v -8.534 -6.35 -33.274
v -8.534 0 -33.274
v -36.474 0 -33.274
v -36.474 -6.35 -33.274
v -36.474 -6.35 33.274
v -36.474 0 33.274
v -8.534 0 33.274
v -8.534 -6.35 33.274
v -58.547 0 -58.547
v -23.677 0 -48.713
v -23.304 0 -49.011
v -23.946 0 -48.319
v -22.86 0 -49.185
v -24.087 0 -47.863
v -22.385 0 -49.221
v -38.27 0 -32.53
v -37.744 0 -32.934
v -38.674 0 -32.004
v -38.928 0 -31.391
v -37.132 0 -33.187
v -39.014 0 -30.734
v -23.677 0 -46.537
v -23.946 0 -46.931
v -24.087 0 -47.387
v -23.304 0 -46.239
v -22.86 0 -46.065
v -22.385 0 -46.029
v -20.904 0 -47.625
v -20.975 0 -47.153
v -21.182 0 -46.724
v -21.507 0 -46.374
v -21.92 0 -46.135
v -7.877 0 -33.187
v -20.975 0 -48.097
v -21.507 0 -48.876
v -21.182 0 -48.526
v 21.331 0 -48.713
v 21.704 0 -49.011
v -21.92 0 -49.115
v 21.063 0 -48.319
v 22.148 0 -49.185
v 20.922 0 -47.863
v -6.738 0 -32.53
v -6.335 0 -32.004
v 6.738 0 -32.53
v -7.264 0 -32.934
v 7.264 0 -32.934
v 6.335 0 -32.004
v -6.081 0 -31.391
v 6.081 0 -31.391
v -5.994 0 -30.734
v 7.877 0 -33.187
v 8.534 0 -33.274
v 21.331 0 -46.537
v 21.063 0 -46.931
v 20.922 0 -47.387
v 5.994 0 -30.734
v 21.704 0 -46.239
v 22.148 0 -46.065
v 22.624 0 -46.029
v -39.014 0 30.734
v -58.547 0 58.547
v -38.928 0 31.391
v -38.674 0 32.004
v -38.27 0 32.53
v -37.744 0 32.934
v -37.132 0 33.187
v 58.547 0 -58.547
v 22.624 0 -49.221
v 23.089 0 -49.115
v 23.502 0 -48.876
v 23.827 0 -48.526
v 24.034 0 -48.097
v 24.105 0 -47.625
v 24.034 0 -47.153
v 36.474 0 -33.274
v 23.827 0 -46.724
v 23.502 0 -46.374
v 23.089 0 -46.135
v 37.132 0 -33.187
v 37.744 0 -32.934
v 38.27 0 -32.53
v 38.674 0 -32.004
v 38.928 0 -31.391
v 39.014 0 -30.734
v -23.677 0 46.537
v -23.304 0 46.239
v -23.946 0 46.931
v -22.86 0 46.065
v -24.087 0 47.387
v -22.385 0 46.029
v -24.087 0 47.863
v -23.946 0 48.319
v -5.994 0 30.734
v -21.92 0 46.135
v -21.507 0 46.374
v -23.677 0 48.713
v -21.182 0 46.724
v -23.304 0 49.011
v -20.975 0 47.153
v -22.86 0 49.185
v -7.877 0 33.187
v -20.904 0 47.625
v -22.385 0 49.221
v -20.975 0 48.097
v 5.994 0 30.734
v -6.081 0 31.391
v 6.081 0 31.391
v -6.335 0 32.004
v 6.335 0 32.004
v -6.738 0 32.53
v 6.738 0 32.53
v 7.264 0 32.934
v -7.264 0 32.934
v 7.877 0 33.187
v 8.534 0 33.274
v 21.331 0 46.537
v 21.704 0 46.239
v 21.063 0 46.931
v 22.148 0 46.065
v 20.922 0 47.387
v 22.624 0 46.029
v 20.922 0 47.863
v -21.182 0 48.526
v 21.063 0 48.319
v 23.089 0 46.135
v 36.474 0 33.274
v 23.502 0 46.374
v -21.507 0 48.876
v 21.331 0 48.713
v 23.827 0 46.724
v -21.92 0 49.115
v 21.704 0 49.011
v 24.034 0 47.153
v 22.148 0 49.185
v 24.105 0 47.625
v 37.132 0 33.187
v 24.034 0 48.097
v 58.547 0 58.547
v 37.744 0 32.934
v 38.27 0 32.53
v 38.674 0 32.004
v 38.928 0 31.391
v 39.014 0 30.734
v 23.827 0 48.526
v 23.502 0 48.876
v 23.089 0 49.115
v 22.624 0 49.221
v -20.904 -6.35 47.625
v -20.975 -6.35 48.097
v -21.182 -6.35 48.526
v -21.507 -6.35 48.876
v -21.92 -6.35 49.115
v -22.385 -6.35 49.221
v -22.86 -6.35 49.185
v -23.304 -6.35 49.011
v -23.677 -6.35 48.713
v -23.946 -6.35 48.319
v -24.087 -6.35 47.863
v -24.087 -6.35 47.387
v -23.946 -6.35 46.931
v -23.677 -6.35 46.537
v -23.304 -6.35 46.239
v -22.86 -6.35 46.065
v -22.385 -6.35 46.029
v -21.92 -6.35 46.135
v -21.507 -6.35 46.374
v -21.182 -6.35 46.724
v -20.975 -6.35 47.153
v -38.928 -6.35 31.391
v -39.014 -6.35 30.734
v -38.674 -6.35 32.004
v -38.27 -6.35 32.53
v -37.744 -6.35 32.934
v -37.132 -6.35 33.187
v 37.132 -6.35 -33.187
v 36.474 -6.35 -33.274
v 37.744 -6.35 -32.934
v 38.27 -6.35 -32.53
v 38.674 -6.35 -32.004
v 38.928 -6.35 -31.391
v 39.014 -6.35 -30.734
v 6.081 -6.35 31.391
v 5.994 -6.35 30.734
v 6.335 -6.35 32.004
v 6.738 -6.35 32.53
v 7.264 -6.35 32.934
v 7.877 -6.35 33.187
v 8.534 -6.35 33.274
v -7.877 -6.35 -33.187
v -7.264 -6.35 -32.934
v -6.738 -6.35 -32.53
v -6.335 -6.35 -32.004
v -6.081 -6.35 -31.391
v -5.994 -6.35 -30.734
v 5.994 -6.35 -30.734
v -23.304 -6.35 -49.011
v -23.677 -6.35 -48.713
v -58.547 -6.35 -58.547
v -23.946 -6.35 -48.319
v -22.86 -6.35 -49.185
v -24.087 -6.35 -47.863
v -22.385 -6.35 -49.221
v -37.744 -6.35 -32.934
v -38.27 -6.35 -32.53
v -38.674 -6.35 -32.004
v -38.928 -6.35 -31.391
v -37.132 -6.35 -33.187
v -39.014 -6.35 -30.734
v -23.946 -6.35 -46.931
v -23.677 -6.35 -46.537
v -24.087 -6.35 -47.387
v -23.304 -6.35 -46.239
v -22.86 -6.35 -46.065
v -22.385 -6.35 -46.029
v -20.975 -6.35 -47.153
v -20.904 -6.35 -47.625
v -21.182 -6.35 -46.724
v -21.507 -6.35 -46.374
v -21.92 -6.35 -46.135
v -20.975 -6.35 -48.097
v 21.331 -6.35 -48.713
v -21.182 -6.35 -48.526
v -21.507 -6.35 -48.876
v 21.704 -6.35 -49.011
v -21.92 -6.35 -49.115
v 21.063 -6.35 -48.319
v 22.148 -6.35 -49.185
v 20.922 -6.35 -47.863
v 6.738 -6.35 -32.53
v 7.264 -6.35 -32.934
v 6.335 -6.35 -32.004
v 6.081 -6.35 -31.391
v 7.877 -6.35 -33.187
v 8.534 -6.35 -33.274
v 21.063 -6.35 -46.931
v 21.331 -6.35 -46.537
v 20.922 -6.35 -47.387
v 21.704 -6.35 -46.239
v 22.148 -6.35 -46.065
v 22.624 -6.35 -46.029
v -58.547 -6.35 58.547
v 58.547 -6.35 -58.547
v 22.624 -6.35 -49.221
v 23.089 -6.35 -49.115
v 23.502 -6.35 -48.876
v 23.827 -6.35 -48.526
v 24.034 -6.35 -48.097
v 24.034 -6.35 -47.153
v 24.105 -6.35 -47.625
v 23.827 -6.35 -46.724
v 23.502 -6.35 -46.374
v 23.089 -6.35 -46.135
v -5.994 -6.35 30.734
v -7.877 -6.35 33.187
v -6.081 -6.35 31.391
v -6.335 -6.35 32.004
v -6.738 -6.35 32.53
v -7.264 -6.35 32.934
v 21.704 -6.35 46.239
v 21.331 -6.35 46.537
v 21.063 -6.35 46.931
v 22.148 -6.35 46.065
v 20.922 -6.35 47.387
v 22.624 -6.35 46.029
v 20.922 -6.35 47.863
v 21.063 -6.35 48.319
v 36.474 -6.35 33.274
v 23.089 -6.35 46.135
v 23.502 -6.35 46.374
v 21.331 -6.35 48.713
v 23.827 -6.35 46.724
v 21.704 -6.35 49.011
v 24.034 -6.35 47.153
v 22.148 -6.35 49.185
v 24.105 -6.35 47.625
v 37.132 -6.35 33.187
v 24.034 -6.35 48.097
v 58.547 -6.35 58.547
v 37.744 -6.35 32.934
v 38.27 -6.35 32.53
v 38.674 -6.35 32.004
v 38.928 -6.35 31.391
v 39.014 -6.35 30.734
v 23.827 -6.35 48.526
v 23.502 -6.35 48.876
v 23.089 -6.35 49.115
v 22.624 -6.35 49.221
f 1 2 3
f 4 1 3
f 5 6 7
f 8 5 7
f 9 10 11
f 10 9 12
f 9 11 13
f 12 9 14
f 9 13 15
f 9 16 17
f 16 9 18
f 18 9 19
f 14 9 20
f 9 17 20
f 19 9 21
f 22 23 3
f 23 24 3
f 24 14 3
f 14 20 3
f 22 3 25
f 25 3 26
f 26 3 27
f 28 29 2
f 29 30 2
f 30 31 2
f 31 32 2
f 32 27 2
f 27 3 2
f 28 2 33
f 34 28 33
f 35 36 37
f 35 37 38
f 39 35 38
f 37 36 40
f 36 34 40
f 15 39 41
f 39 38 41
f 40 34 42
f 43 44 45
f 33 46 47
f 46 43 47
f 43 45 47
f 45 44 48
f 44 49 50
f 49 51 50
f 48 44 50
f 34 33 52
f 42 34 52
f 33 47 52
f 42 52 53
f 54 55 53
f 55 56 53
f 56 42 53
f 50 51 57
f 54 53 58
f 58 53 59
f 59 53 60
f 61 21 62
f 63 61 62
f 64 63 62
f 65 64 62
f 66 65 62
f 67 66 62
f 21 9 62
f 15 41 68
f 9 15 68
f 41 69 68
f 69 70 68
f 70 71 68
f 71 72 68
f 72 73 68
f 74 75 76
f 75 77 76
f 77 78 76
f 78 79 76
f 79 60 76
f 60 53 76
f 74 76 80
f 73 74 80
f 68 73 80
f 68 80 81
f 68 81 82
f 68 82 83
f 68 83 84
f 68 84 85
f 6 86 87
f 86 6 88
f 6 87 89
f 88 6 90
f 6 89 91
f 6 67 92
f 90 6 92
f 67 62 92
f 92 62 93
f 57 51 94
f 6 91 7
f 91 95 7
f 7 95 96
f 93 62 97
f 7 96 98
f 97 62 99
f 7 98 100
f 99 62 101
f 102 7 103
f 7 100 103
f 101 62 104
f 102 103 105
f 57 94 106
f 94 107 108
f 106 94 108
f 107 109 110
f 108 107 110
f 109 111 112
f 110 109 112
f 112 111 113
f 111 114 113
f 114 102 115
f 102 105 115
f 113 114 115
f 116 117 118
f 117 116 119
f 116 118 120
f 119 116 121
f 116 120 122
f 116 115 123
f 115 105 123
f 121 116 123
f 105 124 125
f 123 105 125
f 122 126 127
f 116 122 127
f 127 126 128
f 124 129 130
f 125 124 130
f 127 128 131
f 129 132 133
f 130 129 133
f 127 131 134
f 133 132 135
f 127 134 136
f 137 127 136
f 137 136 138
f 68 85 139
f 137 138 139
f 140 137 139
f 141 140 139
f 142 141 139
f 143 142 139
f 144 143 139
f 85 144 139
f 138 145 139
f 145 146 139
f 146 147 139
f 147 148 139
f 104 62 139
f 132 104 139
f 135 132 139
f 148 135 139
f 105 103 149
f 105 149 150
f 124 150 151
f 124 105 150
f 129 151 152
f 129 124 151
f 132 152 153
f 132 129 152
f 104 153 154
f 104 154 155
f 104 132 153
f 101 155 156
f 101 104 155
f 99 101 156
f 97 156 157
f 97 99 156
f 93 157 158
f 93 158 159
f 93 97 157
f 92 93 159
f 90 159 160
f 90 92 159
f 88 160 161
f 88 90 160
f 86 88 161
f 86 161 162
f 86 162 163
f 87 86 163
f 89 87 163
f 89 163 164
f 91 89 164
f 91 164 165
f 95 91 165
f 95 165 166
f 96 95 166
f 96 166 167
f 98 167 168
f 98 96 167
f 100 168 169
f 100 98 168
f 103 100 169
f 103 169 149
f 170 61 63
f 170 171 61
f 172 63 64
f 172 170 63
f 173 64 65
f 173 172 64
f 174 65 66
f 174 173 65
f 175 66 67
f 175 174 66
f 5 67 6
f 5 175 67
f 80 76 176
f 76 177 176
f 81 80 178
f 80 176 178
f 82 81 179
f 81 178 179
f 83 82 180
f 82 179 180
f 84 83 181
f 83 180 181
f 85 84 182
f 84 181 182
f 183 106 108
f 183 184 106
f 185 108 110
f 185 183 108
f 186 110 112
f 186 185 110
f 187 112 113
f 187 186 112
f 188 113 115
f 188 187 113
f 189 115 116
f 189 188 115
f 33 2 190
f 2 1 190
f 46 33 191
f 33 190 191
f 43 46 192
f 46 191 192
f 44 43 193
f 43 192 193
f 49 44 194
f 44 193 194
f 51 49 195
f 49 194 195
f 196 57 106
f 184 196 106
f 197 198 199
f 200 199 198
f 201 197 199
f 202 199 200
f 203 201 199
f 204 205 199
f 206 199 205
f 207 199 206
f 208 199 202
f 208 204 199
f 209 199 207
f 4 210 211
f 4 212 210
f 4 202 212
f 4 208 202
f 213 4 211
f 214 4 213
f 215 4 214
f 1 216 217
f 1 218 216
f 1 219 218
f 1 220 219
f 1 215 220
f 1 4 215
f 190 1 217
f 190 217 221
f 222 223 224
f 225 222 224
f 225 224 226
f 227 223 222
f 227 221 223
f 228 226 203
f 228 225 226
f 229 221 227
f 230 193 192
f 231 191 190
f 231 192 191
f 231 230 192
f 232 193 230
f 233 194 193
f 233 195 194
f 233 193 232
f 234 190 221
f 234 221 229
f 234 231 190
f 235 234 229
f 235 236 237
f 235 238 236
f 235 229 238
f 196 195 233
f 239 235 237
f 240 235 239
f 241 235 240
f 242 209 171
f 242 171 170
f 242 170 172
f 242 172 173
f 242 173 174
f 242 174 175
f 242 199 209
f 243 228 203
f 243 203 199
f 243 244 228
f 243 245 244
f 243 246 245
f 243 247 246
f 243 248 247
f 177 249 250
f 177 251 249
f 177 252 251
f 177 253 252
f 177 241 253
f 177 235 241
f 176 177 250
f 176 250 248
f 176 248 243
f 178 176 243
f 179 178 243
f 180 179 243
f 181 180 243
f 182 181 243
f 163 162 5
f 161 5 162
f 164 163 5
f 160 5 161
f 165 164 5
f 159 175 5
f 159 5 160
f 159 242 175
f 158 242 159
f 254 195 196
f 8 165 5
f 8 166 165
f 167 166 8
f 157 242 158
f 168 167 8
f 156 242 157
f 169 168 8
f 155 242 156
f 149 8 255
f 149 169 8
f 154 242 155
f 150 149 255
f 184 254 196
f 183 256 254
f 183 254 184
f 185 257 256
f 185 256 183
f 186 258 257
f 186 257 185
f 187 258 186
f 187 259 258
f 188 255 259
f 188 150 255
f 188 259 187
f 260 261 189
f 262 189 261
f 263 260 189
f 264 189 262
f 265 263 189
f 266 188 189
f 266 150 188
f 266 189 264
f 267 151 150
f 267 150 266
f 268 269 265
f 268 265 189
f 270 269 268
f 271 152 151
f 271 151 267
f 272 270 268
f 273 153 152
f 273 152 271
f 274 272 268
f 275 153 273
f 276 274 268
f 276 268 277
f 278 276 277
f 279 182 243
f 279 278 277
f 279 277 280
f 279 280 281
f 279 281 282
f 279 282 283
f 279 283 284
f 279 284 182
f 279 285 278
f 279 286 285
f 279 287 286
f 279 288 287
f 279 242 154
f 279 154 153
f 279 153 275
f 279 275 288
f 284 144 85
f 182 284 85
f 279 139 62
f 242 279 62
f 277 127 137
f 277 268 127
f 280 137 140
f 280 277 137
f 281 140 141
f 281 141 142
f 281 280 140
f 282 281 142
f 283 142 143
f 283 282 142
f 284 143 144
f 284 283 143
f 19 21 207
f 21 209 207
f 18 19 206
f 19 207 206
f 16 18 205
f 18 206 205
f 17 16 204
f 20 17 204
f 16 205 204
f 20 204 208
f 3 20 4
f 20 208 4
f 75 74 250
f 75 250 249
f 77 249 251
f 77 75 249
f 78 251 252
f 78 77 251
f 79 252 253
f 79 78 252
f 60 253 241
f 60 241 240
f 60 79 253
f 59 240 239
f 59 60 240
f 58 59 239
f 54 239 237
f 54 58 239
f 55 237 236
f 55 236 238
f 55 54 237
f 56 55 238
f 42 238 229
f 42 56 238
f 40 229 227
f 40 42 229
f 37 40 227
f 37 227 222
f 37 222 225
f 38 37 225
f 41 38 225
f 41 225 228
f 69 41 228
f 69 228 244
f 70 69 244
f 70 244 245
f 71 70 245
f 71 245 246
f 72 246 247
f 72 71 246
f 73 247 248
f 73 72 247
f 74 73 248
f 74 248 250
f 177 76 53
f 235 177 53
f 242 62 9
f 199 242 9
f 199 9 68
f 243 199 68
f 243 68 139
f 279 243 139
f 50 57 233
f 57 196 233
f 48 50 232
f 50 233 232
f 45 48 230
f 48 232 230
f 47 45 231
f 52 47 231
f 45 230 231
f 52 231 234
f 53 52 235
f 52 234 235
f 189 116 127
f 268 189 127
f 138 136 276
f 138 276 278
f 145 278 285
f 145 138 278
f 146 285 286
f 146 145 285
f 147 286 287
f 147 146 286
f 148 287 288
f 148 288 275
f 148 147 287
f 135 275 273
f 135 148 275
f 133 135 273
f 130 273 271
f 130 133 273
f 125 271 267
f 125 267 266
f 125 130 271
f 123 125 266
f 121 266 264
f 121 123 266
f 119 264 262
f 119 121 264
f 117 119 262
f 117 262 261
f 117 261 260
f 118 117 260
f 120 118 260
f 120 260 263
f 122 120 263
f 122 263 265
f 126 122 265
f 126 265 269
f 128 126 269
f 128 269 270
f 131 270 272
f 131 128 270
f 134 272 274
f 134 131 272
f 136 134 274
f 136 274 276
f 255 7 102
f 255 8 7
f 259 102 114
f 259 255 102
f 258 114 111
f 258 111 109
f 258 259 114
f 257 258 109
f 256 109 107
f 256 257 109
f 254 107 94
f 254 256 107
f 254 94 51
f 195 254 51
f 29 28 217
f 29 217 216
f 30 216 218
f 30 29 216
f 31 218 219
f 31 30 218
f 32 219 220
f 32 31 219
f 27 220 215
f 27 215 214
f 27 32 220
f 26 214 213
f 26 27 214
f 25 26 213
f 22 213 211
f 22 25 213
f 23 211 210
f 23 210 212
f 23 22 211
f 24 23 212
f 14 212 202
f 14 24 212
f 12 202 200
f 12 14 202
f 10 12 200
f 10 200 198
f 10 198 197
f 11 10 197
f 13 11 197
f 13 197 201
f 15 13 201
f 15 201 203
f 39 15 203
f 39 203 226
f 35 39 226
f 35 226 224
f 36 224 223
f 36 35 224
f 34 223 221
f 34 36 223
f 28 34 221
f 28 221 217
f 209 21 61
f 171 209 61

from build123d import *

# Parameters (mm, degrees)
F0_R     = 1.6002
F1_DEPTH = 6.35
F2_R     = 2.54


with BuildPart() as f1:
    # F0 (on Front) → F1 (new body)
    with BuildSketch(Plane.XZ):
        Polygon((58.547, 58.547), (0, 58.547), (-58.547, 58.547), (-58.547, 0), (-58.547, -58.547), (0, -58.547), (58.547, -58.547), (58.547, 0), align=None)
        with Locations((-22.5044, -47.625)):
            Circle(F0_R, mode=Mode.SUBTRACT)
        with Locations((22.5044, -47.625)):
            Circle(F0_R, mode=Mode.SUBTRACT)
        Polygon((-39.0144, 33.274), (-5.9944, 33.274), (-5.9944, 0), (-5.9944, -33.274), (-39.0144, -33.274), (-39.0144, 0), align=None, mode=Mode.SUBTRACT)
        with Locations((-22.5044, 47.625)):
            Circle(F0_R, mode=Mode.SUBTRACT)
        Polygon((5.9944, 0), (5.9944, 33.274), (39.0144, 33.274), (39.0144, 0), (39.0144, -33.274), (5.9944, -33.274), align=None, mode=Mode.SUBTRACT)
        with Locations((22.5044, 47.625)):
            Circle(F0_R, mode=Mode.SUBTRACT)
    extrude(amount=F1_DEPTH)

    # F2
    f2_edges = [f1.edges().sort_by_distance(p)[0] for p in [
        (39.0144, -3.175, 33.274),
        (39.0144, -3.175, -33.274),
        (-5.9944, -3.175, -33.274),
        (-5.9944, -3.175, 33.274),
        (5.9944, -3.175, 33.274),
        (-39.0144, -3.175, 33.274),
        (5.9944, -3.175, -33.274),
        (-39.0144, -3.175, -33.274),
    ]]
    fillet(f2_edges, radius=F2_R)


solid = f1.part
